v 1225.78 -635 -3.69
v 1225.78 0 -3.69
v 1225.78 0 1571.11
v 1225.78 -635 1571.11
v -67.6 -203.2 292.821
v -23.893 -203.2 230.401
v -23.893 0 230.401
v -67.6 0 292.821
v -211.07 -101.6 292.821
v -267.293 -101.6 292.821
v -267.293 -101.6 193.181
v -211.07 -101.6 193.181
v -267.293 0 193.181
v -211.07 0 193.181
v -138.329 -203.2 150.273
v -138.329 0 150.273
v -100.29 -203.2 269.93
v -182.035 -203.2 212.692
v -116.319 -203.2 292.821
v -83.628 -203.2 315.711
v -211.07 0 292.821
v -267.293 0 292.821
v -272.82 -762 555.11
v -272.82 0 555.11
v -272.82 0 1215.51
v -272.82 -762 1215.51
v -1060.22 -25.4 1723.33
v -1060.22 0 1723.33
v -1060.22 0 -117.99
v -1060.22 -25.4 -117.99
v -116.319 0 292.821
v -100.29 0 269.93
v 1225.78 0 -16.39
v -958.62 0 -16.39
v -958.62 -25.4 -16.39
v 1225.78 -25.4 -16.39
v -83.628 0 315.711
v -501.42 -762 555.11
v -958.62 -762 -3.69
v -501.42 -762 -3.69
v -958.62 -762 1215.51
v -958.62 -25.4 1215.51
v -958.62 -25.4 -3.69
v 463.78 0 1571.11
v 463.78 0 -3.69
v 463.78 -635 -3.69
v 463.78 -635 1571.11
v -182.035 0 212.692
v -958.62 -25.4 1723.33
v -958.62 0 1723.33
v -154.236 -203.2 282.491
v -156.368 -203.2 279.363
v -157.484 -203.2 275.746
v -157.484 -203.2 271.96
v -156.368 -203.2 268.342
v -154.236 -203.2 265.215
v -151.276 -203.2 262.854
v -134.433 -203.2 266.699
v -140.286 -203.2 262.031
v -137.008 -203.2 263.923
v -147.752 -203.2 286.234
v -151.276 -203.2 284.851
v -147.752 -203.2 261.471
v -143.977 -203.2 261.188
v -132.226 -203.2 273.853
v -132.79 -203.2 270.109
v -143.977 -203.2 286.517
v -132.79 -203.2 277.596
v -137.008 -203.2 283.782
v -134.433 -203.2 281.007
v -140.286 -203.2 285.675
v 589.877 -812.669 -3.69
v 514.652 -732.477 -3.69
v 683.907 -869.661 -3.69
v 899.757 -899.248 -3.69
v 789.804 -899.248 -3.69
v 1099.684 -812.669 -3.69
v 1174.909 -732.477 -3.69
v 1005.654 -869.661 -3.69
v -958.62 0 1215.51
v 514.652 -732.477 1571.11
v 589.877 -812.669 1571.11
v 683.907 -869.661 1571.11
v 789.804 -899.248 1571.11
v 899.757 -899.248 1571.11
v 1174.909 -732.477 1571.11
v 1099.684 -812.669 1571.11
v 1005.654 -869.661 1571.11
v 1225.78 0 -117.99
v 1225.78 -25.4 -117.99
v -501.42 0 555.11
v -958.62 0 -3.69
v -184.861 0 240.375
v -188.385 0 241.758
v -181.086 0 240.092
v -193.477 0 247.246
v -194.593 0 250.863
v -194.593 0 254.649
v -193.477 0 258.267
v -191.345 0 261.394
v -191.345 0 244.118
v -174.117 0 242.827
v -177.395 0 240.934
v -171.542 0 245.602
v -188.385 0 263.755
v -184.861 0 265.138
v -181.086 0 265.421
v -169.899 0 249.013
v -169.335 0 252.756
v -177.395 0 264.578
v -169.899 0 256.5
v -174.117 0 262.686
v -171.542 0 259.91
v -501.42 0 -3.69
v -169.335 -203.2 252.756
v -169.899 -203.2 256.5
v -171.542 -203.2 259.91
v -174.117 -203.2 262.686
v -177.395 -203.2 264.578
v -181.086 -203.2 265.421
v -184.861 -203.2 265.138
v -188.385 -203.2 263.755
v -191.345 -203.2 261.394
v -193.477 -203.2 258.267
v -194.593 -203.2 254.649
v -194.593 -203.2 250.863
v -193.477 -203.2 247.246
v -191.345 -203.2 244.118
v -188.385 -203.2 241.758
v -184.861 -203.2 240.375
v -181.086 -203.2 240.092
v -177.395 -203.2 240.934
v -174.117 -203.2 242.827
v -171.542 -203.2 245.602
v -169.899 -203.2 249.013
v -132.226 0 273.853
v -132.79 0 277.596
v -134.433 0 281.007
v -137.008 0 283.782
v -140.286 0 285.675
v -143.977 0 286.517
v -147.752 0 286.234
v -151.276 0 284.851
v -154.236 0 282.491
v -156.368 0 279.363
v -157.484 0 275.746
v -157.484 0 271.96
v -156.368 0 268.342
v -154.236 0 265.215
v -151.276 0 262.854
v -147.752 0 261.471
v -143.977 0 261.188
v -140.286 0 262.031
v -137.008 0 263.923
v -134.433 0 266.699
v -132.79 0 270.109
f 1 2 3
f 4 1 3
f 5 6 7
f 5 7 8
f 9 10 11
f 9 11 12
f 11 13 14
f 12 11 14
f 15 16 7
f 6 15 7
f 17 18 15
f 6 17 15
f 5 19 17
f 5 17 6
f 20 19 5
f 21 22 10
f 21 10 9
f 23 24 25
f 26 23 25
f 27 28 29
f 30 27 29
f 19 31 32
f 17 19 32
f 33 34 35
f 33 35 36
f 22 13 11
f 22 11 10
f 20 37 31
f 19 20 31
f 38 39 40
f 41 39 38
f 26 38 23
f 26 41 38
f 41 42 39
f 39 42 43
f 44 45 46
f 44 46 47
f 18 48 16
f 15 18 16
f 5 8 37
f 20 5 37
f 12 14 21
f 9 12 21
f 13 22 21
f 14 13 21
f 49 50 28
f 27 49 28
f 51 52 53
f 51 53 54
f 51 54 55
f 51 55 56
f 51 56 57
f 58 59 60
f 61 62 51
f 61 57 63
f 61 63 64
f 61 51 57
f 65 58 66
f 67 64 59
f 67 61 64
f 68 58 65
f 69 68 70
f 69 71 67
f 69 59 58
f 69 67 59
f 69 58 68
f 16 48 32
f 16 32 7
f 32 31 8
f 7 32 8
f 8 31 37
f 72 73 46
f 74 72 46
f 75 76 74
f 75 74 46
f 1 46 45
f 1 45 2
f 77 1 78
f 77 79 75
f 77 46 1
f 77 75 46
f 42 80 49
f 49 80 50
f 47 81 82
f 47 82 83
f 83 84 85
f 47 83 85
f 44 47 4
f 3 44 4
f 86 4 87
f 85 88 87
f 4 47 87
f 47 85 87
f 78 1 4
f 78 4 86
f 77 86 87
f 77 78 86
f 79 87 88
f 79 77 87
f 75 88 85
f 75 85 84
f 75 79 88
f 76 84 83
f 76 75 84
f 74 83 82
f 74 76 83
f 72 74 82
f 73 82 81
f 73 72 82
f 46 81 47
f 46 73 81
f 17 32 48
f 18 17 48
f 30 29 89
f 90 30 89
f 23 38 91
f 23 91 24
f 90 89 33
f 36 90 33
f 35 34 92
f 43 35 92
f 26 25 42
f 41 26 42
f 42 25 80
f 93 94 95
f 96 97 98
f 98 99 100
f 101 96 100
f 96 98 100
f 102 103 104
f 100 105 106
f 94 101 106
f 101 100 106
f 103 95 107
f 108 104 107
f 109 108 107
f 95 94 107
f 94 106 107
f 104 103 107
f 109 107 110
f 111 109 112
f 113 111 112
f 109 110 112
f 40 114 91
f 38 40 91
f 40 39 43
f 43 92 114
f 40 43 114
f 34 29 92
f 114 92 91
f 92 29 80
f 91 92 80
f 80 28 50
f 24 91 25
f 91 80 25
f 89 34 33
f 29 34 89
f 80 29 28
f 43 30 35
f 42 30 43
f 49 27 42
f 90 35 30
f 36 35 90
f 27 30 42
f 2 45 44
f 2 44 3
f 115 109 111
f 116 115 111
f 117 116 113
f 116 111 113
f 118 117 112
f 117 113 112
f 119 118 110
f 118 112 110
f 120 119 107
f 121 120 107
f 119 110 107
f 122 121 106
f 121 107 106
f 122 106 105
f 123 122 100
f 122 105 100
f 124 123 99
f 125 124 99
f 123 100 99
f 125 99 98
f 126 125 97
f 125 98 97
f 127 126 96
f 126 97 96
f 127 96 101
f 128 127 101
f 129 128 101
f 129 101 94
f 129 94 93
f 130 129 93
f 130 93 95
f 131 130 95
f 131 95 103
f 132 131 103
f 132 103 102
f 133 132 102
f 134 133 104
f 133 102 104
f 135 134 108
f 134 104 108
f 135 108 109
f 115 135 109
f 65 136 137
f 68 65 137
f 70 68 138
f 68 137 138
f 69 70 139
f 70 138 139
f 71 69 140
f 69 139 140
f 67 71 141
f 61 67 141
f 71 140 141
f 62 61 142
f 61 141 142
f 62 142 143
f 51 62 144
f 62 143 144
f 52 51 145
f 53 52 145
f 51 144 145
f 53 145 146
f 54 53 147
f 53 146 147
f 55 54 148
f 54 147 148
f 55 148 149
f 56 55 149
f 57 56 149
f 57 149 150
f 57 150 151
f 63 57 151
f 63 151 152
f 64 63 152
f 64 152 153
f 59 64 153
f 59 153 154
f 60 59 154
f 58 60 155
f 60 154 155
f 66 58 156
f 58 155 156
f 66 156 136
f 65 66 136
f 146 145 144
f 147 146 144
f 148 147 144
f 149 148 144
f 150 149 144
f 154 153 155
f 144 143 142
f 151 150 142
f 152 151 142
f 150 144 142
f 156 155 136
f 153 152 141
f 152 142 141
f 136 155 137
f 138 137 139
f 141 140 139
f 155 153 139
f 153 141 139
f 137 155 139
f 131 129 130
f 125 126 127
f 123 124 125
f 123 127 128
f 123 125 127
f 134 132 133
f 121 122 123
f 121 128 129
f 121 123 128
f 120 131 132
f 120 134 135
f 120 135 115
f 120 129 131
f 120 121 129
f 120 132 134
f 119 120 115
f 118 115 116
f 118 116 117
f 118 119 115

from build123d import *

# Parameters (mm, degrees)
F1_DEPTH = 762
F0_W     = 762
F0_H     = 1574.8
F2_DEPTH = 635
F4_DEPTH = 1574.8
F0_R     = 12.7
F5_DEPTH = 203.2
F0_W_2   = 56.222939
F0_H_2   = 99.639279
F6_DEPTH = 101.6
F0_W_3   = 2184.4
F0_H_3   = 101.6
F7_DEPTH = 25.4


with BuildPart() as f1:
    # F0 (on Front) → F1 (new body)
    with BuildSketch(Plane.XZ):
        Polygon((-958.619627, 1215.509644), (-958.619627, -3.690356), (-501.419627, -3.690356), (-501.419627, 555.109644), (-272.819627, 555.109644), (-272.819627, 1215.509644), (-501.419627, 1215.509644), align=None)
    extrude(amount=F1_DEPTH)

    # F0 (on Front) → F7 (join)
    with BuildSketch(Plane.XZ):
        with Locations((133.580373, -67.190356)):
            Rectangle(F0_W_3, F0_H_3)
        Polygon((-1060.219627, -117.990356), (-958.619627, -117.990356), (-958.619627, -16.390356), (-958.619627, -3.690356), (-958.619627, 1215.509644), (-958.619627, 1723.329544), (-1060.219627, 1723.329544), align=None)
    extrude(amount=F7_DEPTH)


with BuildPart() as f2:
    # F0 (on Front) → F2 (new body)
    with BuildSketch(Plane.XZ):
        with Locations((844.780373, 783.709644)):
            Rectangle(F0_W, F0_H)
    extrude(amount=F2_DEPTH)

    # F3 (on face) → F4 (join)
    with BuildSketch(Plane(origin=(0, 0, -3.690356), x_dir=(1, 0, 0), z_dir=(0, 0, -1))):
        with BuildLine():
            Line((463.780373, 635), (1225.780373, 635))
            ThreePointArc((1225.780373, 635), (844.780373, 902.998708), (463.780373, 635))
        make_face()
    extrude(amount=-F4_DEPTH)


with BuildPart() as f5:
    # F0 (on Front) → F5 (new body)
    with BuildSketch(Plane.XZ):
        Polygon((-182.035163, 212.691968), (-138.328639, 150.272582), (-23.893098, 230.40121), (-67.599623, 292.820596), (-100.29049, 269.930204), align=None)
        Polygon((-100.29049, 269.930204), (-67.599623, 292.820596), (-83.627647, 315.710988), (-116.318515, 292.820596), align=None)
        with Locations((-182.035163, 252.756282)):
            Circle(F0_R)
        with Locations((-144.926032, 273.85272)):
            Circle(F0_R)
    extrude(amount=F5_DEPTH)


with BuildPart() as f6:
    # F0 (on Front) → F6 (new body)
    with BuildSketch(Plane.XZ):
        with Locations((-239.181399, 243.000956)):
            Rectangle(F0_W_2, F0_H_2)
    extrude(amount=F6_DEPTH)


solid = Compound([f1.part, f2.part, f5.part, f6.part])
